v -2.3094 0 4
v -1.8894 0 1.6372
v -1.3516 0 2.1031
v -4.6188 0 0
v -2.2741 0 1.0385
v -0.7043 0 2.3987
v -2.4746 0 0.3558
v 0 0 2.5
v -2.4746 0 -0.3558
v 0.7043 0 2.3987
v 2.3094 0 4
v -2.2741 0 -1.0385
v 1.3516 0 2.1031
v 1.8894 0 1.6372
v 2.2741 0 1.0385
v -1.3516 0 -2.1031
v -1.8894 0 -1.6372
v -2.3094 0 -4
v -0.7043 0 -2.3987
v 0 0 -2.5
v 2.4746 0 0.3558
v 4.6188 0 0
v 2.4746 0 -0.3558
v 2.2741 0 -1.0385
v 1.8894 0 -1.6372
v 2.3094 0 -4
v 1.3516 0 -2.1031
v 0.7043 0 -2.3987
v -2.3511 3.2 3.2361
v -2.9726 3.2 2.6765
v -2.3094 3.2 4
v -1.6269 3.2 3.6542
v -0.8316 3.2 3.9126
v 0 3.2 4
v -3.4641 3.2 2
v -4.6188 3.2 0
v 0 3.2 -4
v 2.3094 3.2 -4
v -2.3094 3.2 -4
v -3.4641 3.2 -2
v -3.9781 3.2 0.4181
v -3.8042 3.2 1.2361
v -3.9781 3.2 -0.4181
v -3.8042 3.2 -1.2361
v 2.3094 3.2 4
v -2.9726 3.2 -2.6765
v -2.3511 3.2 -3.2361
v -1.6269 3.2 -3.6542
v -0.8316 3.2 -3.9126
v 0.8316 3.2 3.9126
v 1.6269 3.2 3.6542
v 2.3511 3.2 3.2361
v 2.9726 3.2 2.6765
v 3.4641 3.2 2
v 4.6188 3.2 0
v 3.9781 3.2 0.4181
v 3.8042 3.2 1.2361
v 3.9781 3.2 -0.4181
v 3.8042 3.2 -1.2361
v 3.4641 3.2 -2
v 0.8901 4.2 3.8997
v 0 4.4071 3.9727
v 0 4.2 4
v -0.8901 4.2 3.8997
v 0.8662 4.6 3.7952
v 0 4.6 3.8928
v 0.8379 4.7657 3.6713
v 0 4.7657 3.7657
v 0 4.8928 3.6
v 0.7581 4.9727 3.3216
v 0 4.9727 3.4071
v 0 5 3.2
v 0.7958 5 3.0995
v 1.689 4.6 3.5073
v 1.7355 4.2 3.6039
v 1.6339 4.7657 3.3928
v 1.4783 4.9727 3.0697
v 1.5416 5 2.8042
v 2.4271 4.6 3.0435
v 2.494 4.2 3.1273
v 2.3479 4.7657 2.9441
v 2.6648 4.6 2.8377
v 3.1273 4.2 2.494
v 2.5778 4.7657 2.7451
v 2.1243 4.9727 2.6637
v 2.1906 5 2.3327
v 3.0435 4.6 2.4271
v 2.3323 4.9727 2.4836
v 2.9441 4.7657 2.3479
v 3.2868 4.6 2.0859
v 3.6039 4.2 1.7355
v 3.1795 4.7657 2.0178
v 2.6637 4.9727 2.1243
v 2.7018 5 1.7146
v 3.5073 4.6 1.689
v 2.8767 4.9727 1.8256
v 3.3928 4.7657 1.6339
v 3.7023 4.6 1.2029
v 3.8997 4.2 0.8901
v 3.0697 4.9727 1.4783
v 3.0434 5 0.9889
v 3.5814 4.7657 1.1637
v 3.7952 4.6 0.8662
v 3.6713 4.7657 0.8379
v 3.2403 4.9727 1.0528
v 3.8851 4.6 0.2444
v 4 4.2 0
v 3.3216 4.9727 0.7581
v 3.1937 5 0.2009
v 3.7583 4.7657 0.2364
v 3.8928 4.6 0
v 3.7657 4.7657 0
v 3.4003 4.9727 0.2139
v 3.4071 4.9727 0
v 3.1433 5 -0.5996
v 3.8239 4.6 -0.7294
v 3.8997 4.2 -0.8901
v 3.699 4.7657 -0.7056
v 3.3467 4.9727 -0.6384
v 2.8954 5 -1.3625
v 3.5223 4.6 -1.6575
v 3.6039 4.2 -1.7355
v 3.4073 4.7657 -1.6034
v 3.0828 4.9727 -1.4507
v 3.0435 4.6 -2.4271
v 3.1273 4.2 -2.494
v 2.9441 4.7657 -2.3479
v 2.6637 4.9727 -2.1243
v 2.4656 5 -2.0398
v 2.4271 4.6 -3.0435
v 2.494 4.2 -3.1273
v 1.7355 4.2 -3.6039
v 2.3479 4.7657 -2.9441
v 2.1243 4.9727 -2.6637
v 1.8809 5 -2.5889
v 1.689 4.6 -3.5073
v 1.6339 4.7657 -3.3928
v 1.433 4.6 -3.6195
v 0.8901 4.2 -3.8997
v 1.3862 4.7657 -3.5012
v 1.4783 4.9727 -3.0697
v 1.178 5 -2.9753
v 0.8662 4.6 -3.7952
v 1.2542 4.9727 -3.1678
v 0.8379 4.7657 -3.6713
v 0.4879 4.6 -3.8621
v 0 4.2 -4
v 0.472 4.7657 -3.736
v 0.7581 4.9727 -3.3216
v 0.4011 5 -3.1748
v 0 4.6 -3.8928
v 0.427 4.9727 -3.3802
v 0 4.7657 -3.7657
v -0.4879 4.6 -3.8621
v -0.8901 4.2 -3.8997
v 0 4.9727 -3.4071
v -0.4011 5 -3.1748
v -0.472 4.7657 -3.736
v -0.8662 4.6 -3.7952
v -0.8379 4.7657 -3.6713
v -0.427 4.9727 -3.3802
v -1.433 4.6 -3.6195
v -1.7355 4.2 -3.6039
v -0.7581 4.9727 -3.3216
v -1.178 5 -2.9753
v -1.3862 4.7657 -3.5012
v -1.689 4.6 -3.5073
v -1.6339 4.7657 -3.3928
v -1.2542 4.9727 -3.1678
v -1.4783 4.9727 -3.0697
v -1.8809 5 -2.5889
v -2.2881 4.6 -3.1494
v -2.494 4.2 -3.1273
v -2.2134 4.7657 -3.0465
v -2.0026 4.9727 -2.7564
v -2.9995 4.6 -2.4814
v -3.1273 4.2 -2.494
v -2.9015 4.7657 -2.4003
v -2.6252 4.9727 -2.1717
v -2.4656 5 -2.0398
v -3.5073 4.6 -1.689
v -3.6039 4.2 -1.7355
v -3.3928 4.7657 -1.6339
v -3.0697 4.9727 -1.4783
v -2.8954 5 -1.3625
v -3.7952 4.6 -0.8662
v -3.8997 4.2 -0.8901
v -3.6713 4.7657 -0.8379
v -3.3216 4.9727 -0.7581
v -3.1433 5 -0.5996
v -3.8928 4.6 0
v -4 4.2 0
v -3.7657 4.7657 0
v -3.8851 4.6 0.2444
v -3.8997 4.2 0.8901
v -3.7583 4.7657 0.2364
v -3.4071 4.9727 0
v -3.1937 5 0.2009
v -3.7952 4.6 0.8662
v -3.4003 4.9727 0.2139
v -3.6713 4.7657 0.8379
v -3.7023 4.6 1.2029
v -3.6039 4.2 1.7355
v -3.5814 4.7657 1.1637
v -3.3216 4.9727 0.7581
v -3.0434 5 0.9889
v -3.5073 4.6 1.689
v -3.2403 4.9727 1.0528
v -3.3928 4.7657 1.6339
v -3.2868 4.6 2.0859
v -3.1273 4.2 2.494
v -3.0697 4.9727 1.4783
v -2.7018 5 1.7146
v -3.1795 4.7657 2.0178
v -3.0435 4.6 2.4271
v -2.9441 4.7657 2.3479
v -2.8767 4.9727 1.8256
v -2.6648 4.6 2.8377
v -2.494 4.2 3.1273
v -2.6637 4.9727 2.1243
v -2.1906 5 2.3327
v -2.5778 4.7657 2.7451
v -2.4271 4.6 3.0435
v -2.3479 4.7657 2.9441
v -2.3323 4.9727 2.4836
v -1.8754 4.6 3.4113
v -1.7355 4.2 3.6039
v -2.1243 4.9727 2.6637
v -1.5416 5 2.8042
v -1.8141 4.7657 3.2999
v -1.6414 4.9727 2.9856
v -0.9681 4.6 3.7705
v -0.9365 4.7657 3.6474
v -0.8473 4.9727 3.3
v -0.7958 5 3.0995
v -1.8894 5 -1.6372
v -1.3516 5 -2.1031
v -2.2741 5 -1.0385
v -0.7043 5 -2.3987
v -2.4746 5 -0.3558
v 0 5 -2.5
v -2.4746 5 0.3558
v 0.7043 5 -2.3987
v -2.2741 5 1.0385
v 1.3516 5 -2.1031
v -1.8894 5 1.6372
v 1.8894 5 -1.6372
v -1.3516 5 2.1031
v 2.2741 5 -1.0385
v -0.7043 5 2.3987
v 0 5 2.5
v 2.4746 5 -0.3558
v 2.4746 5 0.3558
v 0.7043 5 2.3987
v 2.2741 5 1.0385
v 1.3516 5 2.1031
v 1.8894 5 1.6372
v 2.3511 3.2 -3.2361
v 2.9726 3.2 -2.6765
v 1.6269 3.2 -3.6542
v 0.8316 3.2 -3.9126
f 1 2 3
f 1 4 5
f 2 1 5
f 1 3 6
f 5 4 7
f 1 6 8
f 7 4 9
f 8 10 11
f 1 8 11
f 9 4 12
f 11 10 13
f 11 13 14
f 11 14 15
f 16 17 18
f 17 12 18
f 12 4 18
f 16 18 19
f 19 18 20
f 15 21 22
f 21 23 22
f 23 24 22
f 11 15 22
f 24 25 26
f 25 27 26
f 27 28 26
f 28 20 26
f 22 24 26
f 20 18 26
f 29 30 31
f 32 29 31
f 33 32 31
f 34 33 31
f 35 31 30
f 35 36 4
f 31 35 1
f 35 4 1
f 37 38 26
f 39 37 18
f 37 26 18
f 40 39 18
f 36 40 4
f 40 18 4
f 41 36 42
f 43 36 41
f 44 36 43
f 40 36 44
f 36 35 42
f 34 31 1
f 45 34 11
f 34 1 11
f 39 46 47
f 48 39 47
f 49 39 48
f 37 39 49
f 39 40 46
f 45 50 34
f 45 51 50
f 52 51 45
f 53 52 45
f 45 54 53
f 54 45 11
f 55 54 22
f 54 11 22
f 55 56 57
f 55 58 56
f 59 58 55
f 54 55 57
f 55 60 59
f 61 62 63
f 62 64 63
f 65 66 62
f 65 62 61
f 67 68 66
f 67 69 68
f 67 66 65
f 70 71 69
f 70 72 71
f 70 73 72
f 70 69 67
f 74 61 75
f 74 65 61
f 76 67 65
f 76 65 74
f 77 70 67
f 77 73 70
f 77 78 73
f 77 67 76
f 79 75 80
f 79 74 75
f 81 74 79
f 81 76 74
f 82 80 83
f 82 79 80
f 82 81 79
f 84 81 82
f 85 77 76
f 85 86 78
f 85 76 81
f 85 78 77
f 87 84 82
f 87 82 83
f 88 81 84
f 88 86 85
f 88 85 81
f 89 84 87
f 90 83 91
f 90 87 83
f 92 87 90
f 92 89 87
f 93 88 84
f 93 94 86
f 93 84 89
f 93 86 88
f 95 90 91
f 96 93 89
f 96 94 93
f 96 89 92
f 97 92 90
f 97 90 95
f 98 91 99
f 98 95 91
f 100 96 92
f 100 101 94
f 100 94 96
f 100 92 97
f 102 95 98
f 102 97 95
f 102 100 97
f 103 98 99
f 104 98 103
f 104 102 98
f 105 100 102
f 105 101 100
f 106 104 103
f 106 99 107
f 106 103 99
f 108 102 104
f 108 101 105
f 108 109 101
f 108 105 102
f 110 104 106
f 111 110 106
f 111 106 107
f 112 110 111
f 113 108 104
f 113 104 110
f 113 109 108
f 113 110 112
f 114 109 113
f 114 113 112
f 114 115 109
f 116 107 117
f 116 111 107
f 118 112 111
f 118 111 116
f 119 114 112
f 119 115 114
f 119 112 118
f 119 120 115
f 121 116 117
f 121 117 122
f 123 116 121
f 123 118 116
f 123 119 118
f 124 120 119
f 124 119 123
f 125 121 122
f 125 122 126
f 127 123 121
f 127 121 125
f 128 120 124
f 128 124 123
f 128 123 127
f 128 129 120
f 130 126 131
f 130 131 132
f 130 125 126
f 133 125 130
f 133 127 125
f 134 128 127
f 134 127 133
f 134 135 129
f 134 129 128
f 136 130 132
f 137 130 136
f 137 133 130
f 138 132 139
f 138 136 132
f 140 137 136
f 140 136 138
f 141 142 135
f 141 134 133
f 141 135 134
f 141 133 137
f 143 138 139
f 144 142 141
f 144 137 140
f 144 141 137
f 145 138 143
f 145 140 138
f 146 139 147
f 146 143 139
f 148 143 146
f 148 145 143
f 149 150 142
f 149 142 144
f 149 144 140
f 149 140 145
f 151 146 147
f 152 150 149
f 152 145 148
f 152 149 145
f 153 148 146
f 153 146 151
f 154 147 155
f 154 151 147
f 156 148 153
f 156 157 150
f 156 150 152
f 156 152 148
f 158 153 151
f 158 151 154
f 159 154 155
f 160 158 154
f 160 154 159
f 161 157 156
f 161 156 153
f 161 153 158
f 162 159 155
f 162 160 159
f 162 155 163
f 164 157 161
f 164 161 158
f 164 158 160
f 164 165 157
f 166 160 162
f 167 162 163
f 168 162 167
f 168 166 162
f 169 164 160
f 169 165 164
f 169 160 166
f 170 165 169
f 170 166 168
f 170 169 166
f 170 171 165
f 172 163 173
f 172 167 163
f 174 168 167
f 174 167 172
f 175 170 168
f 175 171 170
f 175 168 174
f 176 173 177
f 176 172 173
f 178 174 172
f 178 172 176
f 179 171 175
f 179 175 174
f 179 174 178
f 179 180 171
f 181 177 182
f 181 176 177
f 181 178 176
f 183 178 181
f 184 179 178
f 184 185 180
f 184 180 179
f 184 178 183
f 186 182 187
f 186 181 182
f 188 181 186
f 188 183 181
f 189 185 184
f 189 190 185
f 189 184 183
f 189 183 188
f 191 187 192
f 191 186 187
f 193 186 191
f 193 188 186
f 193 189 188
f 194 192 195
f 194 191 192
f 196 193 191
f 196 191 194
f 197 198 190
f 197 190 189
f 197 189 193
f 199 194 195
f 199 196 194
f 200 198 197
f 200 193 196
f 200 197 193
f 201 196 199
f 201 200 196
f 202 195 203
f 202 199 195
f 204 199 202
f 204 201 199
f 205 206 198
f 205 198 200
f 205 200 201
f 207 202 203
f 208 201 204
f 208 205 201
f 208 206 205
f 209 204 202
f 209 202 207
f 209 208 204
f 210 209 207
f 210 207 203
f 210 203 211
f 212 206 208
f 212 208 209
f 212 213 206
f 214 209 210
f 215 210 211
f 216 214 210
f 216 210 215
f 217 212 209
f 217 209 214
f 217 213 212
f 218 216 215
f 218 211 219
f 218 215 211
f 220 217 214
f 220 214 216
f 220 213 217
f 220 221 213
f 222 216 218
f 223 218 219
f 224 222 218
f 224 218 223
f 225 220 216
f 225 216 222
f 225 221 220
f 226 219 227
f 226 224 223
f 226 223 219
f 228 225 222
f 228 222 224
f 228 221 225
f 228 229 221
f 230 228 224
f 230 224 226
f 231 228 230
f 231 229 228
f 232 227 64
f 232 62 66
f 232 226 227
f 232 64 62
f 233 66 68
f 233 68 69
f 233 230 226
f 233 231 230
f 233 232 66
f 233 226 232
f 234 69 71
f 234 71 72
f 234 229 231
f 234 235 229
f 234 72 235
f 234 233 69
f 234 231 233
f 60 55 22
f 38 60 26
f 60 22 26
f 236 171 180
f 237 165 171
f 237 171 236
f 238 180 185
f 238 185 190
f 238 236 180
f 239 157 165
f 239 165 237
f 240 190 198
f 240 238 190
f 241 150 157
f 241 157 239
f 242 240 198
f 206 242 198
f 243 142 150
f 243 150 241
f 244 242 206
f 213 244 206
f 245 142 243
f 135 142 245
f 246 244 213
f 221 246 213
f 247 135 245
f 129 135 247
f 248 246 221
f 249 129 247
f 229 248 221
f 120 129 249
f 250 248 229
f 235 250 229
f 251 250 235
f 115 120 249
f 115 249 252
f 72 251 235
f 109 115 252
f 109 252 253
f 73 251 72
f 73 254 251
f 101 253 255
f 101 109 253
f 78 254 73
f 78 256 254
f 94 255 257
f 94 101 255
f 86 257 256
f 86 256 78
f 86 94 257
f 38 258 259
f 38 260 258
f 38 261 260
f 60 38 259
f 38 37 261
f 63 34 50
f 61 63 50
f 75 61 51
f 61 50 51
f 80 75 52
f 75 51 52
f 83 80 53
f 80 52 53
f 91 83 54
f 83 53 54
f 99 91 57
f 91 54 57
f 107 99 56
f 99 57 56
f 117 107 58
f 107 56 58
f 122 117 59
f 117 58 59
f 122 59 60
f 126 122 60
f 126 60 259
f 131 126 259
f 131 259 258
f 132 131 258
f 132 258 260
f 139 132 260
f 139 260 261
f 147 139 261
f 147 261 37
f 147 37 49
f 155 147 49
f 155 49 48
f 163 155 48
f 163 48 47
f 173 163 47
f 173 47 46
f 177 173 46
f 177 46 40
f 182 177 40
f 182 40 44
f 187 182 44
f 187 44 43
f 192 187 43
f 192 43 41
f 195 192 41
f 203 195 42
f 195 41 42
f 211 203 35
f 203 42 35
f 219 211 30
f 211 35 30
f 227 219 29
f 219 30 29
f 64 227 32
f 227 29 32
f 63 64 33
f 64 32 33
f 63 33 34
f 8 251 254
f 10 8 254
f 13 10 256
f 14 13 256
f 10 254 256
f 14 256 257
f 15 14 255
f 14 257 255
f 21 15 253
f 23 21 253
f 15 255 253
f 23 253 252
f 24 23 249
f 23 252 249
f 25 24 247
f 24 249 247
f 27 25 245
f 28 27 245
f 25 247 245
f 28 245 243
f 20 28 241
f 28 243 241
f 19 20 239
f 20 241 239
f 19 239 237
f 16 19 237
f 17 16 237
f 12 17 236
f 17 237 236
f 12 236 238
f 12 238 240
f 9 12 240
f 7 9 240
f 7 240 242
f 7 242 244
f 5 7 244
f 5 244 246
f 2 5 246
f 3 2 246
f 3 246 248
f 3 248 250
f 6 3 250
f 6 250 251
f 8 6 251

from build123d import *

# Parameters (mm, degrees)
BOSS_EXTRUDE1_DEPTH = 3.2
SKETCH2_R           = 4
BOSS_EXTRUDE2_DEPTH = 1.8
SKETCH3_R           = 2.5
CUT_EXTRUDE1_DEPTH  = 8.895146188
FILLET1_R           = 0.8


with BuildPart() as part:
    # Sketch1 → Boss-Extrude1 (new body)
    with BuildSketch(Plane(origin=(0, 0, 0), x_dir=(1, 0, 0), z_dir=(0, 1, 0))):
        Polygon((4.618802154, 0), (2.309401077, 4), (-2.309401077, 4), (-4.618802154, 0), (-2.309401077, -4), (2.309401077, -4), align=None)
    extrude(amount=BOSS_EXTRUDE1_DEPTH)

    # Sketch2 → Boss-Extrude2 (add)
    with BuildSketch(Plane(origin=(0, 3.2, 0), x_dir=(1, 0, 0), z_dir=(0, 1, 0))):
        with Locations(Location((0, 0, 0), (0, 0, 270))):
            Circle(SKETCH2_R)
    extrude(amount=BOSS_EXTRUDE2_DEPTH)

    # Sketch3 → Cut-Extrude1 (cut, through all)
    with BuildSketch(Plane(origin=(0, 5, 0), x_dir=(1, 0, 0), z_dir=(0, 1, 0))):
        with Locations(Location((0, 0, 0), (0, 0, 270))):
            Circle(SKETCH3_R)
    extrude(amount=-CUT_EXTRUDE1_DEPTH, mode=Mode.SUBTRACT)

    # Fillet1
    fillet1_edges = [part.edges().sort_by_distance(p)[0] for p in [
        (0, 5, -4),
    ]]
    fillet(fillet1_edges, radius=FILLET1_R)


solid = part.part
